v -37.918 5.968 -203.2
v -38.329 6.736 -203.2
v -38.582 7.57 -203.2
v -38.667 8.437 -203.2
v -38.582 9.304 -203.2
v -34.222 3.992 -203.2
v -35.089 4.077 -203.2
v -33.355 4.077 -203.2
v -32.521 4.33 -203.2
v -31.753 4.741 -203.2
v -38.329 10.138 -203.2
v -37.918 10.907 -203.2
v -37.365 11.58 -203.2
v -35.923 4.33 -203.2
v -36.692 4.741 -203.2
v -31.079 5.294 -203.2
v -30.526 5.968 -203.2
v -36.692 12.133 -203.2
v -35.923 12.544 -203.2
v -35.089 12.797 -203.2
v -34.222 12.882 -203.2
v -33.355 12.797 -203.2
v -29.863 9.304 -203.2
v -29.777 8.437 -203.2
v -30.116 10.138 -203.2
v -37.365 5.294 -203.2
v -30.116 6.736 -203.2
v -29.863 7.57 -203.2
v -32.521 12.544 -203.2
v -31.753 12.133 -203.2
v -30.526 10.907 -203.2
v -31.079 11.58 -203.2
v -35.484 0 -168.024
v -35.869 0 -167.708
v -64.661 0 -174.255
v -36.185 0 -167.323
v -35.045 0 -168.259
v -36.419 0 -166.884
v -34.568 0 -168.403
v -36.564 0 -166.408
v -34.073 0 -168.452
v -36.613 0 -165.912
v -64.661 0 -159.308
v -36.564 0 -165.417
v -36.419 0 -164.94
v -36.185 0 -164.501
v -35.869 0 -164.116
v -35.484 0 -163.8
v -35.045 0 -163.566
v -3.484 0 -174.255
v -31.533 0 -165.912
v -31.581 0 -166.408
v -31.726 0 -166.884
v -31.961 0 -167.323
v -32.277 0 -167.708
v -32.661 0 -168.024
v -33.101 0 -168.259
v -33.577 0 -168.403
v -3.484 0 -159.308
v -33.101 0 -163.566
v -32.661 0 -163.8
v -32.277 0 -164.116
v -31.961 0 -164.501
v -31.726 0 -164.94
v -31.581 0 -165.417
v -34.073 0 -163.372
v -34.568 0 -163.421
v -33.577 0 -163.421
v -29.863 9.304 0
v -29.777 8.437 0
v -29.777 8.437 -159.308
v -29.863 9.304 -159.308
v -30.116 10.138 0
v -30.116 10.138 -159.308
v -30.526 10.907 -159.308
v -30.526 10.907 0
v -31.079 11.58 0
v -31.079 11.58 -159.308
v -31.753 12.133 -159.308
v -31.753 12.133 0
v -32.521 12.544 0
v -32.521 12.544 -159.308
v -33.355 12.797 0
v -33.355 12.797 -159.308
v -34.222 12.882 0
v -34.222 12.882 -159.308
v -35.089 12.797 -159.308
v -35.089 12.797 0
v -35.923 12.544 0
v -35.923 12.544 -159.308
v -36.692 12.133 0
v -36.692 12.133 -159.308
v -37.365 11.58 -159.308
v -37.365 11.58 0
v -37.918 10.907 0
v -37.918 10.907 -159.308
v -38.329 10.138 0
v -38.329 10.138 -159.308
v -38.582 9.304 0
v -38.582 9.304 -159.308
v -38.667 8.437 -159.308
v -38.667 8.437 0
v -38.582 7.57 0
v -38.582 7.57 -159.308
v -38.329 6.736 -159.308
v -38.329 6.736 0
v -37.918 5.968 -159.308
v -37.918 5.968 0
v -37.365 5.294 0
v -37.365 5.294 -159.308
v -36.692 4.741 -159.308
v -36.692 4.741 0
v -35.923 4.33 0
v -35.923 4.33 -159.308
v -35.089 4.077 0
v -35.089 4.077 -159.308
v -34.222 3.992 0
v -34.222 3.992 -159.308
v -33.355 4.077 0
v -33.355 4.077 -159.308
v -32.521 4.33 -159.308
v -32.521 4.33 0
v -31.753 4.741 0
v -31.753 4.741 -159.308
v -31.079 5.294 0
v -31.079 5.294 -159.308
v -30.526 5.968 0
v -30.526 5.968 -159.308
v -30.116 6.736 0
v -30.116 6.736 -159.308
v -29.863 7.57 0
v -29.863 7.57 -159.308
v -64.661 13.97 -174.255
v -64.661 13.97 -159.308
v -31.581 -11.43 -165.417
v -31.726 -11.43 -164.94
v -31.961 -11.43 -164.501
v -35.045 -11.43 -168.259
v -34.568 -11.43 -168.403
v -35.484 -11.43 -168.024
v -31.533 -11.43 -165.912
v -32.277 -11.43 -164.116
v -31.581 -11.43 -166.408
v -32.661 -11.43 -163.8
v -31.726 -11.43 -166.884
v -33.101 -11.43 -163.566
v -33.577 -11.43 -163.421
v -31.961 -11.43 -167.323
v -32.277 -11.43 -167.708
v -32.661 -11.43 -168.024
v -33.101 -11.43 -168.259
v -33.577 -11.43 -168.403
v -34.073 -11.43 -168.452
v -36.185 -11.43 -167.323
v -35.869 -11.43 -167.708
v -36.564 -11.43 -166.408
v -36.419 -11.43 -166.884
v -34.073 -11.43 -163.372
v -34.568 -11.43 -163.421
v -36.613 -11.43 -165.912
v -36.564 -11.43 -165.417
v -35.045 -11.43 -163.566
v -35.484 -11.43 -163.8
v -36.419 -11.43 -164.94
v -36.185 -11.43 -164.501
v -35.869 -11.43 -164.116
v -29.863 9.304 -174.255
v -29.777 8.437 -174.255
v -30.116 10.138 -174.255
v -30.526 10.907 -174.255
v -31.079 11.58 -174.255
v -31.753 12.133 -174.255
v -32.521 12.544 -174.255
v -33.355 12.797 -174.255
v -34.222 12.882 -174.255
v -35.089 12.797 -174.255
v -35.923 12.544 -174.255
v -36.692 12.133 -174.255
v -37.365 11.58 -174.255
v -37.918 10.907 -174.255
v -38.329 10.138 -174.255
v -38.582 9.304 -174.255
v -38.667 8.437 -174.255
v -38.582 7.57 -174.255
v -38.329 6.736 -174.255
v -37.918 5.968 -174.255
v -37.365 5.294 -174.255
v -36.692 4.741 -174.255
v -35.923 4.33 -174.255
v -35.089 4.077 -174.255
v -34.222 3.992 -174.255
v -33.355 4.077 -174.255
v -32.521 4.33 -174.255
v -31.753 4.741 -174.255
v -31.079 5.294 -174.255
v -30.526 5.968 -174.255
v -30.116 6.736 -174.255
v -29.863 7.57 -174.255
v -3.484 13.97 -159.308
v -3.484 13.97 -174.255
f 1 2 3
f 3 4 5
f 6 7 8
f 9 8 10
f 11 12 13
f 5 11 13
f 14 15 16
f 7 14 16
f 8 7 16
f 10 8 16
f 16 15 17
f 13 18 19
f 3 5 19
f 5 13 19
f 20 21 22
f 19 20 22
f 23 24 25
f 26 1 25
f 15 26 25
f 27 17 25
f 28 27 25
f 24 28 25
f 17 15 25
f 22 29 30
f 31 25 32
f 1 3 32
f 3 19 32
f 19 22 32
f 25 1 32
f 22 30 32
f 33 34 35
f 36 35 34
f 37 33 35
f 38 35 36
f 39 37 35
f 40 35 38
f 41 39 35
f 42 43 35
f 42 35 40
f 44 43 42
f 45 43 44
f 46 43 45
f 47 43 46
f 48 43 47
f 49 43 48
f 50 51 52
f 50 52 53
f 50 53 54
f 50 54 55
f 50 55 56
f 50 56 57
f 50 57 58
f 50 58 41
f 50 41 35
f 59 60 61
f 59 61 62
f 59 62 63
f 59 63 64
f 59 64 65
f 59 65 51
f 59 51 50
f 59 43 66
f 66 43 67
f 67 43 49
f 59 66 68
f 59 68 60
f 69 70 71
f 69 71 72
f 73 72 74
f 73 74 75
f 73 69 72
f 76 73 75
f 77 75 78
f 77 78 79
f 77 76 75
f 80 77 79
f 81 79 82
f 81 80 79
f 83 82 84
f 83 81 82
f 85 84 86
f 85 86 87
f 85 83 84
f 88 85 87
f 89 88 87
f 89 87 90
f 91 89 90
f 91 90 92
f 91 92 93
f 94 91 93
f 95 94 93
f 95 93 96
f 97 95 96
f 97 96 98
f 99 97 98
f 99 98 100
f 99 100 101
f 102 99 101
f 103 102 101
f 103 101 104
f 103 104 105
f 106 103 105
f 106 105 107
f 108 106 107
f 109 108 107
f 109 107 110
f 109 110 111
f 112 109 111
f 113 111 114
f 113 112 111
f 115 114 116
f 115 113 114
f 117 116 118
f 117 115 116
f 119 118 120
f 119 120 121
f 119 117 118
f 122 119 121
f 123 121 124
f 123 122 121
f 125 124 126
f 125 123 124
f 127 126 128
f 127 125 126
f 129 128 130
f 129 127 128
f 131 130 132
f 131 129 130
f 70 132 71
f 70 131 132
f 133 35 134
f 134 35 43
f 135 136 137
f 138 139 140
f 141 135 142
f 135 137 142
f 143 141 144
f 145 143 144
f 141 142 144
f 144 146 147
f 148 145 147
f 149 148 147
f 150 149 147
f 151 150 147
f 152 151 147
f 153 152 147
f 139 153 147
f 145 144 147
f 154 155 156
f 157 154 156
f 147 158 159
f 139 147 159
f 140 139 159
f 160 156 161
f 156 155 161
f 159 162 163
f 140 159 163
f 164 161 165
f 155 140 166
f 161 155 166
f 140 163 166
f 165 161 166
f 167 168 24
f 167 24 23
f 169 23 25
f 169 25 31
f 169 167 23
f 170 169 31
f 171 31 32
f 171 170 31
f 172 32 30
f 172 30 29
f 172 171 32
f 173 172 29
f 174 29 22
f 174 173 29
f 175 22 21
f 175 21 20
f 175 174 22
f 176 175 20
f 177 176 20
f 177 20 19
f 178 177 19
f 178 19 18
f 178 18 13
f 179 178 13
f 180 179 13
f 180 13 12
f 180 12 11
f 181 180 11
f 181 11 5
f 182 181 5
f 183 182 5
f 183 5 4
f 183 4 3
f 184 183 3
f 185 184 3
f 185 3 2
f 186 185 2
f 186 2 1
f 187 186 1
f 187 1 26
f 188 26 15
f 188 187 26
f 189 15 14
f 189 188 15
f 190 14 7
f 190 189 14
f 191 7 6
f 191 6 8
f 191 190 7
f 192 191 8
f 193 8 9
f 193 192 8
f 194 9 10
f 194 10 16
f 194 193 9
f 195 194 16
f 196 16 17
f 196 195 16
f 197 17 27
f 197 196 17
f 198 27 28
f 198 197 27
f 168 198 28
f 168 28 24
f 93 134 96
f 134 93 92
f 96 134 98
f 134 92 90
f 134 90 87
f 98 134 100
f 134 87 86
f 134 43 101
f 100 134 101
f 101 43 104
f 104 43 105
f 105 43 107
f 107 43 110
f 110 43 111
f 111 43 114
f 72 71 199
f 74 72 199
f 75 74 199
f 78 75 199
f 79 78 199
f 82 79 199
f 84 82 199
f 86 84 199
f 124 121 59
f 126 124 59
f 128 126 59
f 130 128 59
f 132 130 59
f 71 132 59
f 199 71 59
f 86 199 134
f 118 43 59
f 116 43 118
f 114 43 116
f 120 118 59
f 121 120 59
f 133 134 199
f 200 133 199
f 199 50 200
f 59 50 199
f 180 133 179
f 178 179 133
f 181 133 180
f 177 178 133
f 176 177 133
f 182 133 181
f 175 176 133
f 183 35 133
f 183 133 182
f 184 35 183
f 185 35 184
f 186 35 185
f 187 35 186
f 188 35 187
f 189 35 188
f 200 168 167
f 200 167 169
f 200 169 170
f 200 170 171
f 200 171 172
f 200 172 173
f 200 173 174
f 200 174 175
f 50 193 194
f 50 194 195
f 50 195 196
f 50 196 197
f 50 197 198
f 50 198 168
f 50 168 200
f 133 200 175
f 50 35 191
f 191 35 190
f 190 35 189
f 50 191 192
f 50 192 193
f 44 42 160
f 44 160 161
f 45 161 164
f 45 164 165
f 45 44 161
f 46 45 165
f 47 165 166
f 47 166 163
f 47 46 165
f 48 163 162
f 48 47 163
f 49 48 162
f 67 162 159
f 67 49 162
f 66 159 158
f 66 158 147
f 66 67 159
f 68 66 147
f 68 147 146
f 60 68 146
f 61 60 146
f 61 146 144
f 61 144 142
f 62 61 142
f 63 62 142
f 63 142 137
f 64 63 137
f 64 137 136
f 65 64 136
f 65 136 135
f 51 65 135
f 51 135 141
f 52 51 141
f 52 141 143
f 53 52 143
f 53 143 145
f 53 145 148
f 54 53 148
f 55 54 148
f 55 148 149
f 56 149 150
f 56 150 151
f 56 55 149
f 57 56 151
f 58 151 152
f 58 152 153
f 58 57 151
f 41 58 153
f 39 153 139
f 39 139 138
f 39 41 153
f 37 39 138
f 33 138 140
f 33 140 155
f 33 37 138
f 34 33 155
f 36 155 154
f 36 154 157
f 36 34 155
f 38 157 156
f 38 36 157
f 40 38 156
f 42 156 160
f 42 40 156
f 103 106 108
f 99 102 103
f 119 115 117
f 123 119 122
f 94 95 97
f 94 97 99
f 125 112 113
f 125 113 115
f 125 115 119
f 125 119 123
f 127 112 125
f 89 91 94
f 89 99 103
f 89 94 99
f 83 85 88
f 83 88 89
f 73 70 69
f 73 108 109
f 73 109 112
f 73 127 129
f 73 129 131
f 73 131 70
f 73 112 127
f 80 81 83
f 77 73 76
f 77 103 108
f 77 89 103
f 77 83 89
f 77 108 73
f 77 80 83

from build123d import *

# Parameters (mm, degrees)
F0_R     = 4.445
F1_DEPTH = 203.2
F2_W     = 61.176687
F2_H     = 14.94658
F2_R     = 2.485662
F3_DEPTH = 13.97
F4_R     = 2.54
F5_DEPTH = 25.4


with BuildPart() as f1:
    # F0 (on Top) → F1 (new body)
    with BuildSketch(Plane.XY):
        with Locations((-34.222286, 8.437074)):
            Circle(F0_R)
    extrude(amount=-F1_DEPTH)

    # F2 (on Front) → F3 (join)
    with BuildSketch(Plane.XZ):
        with Locations((-34.07263, -166.781291)):
            Rectangle(F2_W, F2_H)
        with Locations((-34.072631, -165.9123)):
            Circle(F2_R, mode=Mode.SUBTRACT)
    extrude(amount=-F3_DEPTH)

    # F4 (on face) → F5 (join)
    with BuildSketch(Plane(origin=(0, 13.97, 0), x_dir=(-1, 0, 0), z_dir=(0, 1, 0))):
        with Locations((34.072631, -165.9123)):
            Circle(F4_R)
    extrude(amount=-F5_DEPTH)


solid = f1.part
